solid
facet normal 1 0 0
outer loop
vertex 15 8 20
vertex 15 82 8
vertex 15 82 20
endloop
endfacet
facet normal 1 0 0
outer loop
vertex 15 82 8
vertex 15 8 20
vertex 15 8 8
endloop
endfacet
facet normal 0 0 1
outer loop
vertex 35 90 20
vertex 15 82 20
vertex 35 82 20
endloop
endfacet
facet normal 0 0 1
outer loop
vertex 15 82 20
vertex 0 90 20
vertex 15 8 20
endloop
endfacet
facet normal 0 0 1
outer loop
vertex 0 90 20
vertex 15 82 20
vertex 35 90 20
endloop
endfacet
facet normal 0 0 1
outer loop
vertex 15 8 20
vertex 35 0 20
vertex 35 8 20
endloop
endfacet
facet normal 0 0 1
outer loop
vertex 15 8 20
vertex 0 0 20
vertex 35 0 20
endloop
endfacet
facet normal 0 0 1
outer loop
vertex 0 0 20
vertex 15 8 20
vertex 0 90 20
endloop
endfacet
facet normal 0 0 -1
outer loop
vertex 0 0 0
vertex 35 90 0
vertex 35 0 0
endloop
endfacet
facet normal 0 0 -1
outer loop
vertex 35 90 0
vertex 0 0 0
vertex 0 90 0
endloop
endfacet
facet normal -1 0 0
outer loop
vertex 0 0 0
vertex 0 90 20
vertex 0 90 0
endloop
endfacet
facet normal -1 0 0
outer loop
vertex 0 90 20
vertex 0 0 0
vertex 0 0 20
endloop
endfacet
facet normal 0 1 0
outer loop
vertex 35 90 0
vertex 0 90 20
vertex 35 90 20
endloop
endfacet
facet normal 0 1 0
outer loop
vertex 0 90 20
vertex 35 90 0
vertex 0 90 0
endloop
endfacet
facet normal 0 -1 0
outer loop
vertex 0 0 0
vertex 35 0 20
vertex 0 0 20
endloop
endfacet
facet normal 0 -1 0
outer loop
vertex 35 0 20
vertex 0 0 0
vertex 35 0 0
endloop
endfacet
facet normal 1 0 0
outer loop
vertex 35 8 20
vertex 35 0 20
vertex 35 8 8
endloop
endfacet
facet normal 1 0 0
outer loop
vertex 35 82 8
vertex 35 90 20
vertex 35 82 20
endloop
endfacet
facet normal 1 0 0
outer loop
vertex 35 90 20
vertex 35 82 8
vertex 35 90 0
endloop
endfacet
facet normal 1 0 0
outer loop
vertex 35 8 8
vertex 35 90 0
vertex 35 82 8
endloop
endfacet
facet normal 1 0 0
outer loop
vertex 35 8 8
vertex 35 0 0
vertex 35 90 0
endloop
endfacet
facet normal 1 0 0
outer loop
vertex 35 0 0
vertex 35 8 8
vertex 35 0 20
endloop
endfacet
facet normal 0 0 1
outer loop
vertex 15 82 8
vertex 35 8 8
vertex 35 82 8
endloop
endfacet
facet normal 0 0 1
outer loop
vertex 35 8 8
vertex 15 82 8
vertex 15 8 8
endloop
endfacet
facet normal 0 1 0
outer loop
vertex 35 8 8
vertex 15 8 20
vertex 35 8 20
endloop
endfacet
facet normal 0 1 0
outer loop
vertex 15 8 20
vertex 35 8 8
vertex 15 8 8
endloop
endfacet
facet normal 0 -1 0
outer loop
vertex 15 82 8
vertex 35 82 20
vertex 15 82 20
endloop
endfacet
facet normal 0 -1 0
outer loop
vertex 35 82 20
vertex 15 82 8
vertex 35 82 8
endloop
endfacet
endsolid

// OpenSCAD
sandalan_dimensions = [15, 90, 20];
upuan_dimensions = [sandalan_dimensions[0] + 20, 90, 8];
armrest_dimensions = [upuan_dimensions[0], 8, sandalan_dimensions[2]-upuan_dimensions[2]];

module sofa(sd=sandalan_dimensions, ud=upuan_dimensions, ad=armrest_dimensions) {
    module sandalan(s=sd) { cube(s); };
    module upuan(s=ud) { cube(s); };
    module armrest(s=ad) { cube(s); };
    sandalan();
    upuan();
    translate([0,0,ud[2]]) armrest();
    translate([0,ud[1]-ad[1],ud[2]]) armrest();
};

sofa();
